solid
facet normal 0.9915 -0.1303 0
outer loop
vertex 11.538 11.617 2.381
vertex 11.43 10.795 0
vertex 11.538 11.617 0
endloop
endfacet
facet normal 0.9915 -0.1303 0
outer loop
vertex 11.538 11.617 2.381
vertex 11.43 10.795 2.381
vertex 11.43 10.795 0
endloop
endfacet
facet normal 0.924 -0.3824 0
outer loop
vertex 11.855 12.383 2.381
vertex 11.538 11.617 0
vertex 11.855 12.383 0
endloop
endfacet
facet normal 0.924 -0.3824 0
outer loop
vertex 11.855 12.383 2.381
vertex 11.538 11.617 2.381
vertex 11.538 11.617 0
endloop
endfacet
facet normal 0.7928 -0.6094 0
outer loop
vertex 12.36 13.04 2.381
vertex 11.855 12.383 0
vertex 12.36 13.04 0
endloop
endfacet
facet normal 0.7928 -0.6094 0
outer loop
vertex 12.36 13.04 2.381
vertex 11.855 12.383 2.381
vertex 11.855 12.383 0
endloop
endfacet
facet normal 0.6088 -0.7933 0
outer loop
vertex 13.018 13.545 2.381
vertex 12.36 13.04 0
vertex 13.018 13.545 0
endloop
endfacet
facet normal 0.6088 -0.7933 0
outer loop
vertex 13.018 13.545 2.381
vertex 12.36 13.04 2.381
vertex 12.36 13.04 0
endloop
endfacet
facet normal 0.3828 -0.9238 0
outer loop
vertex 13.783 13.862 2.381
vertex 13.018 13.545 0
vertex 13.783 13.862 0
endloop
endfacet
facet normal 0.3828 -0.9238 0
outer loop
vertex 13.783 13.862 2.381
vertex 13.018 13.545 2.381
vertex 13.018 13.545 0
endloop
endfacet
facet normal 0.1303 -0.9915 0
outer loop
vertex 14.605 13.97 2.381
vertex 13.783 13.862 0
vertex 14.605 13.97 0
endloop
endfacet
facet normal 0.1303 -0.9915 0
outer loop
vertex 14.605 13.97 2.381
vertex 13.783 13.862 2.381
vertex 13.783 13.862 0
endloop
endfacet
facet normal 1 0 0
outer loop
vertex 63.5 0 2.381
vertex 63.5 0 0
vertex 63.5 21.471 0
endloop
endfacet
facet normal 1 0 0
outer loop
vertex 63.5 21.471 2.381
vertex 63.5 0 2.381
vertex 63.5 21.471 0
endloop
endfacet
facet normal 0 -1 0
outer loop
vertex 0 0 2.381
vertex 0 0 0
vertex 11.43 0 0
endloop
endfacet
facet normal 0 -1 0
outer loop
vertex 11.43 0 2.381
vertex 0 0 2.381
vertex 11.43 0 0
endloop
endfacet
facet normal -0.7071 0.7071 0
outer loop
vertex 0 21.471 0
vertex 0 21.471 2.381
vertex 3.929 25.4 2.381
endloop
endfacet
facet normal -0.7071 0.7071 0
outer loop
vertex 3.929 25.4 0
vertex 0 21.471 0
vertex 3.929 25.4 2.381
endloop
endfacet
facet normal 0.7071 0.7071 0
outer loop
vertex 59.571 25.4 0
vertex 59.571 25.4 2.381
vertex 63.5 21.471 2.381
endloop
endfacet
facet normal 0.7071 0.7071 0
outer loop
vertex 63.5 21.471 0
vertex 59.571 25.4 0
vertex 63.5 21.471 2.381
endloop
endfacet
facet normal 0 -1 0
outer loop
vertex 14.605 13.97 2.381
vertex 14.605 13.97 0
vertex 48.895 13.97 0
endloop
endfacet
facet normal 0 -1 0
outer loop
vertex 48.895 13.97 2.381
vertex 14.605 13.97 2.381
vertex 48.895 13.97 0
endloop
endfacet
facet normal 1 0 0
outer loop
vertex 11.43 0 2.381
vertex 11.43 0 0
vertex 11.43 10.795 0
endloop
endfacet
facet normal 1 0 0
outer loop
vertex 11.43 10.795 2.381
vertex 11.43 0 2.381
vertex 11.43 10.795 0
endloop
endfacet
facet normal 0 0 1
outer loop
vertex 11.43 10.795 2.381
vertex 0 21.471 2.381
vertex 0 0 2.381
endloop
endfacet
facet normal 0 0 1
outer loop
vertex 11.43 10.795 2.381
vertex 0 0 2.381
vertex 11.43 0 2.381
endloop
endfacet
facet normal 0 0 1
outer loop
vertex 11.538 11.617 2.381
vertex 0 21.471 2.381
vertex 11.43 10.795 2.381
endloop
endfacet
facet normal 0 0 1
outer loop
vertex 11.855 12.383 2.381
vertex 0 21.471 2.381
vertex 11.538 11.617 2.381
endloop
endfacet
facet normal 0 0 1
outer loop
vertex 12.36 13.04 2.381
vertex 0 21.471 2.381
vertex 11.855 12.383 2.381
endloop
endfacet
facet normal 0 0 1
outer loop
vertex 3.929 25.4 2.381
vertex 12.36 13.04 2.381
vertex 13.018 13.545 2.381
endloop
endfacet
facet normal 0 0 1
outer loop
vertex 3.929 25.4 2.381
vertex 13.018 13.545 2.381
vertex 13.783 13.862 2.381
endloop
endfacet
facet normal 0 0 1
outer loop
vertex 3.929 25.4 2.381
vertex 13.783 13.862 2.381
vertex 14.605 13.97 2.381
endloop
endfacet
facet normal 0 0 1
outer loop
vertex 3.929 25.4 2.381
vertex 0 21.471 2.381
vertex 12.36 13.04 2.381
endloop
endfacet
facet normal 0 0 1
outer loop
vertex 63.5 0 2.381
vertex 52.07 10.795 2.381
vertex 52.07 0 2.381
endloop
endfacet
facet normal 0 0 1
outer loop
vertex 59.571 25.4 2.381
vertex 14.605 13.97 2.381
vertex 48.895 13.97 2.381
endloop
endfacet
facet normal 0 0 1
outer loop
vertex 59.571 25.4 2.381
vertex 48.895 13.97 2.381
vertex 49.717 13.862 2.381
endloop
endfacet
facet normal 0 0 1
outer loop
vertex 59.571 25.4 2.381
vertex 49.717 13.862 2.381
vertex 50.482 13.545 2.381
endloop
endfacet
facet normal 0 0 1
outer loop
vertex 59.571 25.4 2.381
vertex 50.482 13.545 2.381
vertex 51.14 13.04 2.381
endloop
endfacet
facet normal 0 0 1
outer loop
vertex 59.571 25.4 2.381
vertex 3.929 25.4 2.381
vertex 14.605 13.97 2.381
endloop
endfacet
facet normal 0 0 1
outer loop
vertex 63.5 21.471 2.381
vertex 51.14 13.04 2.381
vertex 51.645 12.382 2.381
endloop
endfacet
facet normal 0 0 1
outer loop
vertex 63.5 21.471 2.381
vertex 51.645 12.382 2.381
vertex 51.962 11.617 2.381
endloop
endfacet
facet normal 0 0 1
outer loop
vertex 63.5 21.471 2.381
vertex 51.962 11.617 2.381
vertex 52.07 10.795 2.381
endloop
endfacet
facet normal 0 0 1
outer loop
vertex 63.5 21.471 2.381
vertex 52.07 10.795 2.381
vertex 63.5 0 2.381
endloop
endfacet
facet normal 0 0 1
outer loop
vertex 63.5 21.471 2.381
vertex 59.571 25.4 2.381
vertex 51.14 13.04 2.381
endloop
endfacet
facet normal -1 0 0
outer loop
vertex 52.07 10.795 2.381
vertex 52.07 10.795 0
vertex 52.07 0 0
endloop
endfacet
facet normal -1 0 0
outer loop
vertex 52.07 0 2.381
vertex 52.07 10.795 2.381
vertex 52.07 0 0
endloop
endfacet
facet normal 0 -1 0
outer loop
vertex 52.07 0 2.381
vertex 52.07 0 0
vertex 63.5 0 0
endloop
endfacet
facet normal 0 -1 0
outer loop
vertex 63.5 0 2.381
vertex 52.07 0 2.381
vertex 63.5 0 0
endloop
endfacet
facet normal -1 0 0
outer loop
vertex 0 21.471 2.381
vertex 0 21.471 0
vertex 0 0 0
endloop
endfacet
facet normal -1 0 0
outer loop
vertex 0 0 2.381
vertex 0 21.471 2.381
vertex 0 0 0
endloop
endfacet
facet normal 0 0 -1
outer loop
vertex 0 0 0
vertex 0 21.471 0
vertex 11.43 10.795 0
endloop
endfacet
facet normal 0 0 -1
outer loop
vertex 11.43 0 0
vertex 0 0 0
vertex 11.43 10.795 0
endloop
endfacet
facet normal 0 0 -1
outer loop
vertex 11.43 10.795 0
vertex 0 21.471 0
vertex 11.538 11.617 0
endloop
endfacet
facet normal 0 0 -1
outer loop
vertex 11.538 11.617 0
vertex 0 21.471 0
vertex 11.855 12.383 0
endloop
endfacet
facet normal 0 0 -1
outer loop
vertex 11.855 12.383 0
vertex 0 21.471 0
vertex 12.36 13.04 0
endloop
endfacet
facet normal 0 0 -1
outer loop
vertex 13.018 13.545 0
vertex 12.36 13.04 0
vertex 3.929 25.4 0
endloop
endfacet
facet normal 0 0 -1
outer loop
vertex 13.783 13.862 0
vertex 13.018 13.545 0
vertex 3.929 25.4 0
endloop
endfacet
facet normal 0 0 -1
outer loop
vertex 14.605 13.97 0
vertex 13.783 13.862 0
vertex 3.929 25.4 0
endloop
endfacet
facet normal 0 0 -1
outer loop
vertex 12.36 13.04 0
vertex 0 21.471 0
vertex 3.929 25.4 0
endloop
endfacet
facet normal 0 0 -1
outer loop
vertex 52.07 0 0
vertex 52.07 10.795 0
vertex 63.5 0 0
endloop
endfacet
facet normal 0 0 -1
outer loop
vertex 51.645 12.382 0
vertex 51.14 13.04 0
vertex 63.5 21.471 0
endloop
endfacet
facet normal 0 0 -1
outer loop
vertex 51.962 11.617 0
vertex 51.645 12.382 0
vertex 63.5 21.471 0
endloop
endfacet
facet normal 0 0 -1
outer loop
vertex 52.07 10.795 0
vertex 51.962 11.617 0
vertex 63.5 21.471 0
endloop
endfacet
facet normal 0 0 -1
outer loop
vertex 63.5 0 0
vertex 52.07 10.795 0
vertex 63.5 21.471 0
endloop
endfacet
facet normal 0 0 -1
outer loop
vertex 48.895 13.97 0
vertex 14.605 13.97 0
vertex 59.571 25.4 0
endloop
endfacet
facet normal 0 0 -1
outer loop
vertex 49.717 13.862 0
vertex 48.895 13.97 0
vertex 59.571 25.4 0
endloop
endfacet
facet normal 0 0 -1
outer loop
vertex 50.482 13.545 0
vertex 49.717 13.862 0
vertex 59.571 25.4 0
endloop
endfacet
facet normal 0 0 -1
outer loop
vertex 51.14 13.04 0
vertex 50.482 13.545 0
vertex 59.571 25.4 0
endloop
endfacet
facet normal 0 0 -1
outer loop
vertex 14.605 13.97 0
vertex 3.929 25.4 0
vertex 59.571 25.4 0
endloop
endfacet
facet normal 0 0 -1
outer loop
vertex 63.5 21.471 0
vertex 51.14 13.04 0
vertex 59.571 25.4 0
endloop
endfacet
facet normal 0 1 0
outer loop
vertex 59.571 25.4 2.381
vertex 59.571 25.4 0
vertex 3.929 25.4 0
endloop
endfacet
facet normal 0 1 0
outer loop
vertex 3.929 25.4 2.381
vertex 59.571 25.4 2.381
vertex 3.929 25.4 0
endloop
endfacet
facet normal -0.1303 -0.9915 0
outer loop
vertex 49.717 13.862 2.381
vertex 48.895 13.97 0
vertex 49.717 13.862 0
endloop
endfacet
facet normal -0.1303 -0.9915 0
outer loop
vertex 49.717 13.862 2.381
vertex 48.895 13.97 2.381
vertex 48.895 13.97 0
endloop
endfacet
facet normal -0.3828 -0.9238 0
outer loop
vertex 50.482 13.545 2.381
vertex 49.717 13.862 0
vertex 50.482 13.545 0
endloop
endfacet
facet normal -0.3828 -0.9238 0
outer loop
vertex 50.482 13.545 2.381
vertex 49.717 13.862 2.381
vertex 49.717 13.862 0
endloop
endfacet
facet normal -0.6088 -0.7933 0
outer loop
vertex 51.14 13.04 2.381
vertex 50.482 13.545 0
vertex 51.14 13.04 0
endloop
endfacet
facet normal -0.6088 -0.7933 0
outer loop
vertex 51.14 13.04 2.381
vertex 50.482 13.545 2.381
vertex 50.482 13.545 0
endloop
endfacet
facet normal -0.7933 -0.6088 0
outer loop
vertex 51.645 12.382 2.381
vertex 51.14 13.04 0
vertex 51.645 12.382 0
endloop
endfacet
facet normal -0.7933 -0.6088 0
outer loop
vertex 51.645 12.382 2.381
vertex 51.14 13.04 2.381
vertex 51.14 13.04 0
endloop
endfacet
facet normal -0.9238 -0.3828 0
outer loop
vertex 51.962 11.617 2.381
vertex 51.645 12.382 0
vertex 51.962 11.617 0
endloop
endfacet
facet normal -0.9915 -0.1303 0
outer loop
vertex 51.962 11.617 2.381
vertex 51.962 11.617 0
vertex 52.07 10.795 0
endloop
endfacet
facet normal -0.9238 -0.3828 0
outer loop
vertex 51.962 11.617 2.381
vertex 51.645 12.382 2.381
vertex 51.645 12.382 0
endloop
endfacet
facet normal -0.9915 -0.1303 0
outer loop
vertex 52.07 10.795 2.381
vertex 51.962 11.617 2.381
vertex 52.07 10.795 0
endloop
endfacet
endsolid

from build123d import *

# Parameters (mm, degrees)
BOSS_EXTRUDE1_DEPTH = 2.38125
FILLET1_R           = 3.175
CUT_EXTRUDE1_DEPTH  = 69.433035528


with BuildPart() as part:
    # Sketch1 → Boss-Extrude1 (new body)
    with BuildSketch(Plane.XY):
        Polygon((0, 0), (11.43, 0), (11.43, 13.97), (52.07, 13.97), (52.07, 0), (63.5, 0), (63.5, 25.4), (0, 25.4), align=None)
    extrude(amount=BOSS_EXTRUDE1_DEPTH)

    # Fillet1
    fillet1_edges = [part.edges().sort_by_distance(p)[0] for p in [
        (52.07, 13.97, 1.190625),
        (11.43, 13.97, 1.190625),
    ]]
    fillet(fillet1_edges, radius=FILLET1_R)

    # Sketch2 → Cut-Extrude1 (cut, through all)
    with BuildSketch(Plane.XY.offset(2.38125)):
        Polygon((0, 25.4), (0, 21.471137947), (3.928862053, 25.4), align=None)
        Polygon((63.5, 25.4), (59.571137947, 25.4), (63.5, 21.471137947), align=None)
    extrude(amount=-CUT_EXTRUDE1_DEPTH, mode=Mode.SUBTRACT)


solid = part.part
